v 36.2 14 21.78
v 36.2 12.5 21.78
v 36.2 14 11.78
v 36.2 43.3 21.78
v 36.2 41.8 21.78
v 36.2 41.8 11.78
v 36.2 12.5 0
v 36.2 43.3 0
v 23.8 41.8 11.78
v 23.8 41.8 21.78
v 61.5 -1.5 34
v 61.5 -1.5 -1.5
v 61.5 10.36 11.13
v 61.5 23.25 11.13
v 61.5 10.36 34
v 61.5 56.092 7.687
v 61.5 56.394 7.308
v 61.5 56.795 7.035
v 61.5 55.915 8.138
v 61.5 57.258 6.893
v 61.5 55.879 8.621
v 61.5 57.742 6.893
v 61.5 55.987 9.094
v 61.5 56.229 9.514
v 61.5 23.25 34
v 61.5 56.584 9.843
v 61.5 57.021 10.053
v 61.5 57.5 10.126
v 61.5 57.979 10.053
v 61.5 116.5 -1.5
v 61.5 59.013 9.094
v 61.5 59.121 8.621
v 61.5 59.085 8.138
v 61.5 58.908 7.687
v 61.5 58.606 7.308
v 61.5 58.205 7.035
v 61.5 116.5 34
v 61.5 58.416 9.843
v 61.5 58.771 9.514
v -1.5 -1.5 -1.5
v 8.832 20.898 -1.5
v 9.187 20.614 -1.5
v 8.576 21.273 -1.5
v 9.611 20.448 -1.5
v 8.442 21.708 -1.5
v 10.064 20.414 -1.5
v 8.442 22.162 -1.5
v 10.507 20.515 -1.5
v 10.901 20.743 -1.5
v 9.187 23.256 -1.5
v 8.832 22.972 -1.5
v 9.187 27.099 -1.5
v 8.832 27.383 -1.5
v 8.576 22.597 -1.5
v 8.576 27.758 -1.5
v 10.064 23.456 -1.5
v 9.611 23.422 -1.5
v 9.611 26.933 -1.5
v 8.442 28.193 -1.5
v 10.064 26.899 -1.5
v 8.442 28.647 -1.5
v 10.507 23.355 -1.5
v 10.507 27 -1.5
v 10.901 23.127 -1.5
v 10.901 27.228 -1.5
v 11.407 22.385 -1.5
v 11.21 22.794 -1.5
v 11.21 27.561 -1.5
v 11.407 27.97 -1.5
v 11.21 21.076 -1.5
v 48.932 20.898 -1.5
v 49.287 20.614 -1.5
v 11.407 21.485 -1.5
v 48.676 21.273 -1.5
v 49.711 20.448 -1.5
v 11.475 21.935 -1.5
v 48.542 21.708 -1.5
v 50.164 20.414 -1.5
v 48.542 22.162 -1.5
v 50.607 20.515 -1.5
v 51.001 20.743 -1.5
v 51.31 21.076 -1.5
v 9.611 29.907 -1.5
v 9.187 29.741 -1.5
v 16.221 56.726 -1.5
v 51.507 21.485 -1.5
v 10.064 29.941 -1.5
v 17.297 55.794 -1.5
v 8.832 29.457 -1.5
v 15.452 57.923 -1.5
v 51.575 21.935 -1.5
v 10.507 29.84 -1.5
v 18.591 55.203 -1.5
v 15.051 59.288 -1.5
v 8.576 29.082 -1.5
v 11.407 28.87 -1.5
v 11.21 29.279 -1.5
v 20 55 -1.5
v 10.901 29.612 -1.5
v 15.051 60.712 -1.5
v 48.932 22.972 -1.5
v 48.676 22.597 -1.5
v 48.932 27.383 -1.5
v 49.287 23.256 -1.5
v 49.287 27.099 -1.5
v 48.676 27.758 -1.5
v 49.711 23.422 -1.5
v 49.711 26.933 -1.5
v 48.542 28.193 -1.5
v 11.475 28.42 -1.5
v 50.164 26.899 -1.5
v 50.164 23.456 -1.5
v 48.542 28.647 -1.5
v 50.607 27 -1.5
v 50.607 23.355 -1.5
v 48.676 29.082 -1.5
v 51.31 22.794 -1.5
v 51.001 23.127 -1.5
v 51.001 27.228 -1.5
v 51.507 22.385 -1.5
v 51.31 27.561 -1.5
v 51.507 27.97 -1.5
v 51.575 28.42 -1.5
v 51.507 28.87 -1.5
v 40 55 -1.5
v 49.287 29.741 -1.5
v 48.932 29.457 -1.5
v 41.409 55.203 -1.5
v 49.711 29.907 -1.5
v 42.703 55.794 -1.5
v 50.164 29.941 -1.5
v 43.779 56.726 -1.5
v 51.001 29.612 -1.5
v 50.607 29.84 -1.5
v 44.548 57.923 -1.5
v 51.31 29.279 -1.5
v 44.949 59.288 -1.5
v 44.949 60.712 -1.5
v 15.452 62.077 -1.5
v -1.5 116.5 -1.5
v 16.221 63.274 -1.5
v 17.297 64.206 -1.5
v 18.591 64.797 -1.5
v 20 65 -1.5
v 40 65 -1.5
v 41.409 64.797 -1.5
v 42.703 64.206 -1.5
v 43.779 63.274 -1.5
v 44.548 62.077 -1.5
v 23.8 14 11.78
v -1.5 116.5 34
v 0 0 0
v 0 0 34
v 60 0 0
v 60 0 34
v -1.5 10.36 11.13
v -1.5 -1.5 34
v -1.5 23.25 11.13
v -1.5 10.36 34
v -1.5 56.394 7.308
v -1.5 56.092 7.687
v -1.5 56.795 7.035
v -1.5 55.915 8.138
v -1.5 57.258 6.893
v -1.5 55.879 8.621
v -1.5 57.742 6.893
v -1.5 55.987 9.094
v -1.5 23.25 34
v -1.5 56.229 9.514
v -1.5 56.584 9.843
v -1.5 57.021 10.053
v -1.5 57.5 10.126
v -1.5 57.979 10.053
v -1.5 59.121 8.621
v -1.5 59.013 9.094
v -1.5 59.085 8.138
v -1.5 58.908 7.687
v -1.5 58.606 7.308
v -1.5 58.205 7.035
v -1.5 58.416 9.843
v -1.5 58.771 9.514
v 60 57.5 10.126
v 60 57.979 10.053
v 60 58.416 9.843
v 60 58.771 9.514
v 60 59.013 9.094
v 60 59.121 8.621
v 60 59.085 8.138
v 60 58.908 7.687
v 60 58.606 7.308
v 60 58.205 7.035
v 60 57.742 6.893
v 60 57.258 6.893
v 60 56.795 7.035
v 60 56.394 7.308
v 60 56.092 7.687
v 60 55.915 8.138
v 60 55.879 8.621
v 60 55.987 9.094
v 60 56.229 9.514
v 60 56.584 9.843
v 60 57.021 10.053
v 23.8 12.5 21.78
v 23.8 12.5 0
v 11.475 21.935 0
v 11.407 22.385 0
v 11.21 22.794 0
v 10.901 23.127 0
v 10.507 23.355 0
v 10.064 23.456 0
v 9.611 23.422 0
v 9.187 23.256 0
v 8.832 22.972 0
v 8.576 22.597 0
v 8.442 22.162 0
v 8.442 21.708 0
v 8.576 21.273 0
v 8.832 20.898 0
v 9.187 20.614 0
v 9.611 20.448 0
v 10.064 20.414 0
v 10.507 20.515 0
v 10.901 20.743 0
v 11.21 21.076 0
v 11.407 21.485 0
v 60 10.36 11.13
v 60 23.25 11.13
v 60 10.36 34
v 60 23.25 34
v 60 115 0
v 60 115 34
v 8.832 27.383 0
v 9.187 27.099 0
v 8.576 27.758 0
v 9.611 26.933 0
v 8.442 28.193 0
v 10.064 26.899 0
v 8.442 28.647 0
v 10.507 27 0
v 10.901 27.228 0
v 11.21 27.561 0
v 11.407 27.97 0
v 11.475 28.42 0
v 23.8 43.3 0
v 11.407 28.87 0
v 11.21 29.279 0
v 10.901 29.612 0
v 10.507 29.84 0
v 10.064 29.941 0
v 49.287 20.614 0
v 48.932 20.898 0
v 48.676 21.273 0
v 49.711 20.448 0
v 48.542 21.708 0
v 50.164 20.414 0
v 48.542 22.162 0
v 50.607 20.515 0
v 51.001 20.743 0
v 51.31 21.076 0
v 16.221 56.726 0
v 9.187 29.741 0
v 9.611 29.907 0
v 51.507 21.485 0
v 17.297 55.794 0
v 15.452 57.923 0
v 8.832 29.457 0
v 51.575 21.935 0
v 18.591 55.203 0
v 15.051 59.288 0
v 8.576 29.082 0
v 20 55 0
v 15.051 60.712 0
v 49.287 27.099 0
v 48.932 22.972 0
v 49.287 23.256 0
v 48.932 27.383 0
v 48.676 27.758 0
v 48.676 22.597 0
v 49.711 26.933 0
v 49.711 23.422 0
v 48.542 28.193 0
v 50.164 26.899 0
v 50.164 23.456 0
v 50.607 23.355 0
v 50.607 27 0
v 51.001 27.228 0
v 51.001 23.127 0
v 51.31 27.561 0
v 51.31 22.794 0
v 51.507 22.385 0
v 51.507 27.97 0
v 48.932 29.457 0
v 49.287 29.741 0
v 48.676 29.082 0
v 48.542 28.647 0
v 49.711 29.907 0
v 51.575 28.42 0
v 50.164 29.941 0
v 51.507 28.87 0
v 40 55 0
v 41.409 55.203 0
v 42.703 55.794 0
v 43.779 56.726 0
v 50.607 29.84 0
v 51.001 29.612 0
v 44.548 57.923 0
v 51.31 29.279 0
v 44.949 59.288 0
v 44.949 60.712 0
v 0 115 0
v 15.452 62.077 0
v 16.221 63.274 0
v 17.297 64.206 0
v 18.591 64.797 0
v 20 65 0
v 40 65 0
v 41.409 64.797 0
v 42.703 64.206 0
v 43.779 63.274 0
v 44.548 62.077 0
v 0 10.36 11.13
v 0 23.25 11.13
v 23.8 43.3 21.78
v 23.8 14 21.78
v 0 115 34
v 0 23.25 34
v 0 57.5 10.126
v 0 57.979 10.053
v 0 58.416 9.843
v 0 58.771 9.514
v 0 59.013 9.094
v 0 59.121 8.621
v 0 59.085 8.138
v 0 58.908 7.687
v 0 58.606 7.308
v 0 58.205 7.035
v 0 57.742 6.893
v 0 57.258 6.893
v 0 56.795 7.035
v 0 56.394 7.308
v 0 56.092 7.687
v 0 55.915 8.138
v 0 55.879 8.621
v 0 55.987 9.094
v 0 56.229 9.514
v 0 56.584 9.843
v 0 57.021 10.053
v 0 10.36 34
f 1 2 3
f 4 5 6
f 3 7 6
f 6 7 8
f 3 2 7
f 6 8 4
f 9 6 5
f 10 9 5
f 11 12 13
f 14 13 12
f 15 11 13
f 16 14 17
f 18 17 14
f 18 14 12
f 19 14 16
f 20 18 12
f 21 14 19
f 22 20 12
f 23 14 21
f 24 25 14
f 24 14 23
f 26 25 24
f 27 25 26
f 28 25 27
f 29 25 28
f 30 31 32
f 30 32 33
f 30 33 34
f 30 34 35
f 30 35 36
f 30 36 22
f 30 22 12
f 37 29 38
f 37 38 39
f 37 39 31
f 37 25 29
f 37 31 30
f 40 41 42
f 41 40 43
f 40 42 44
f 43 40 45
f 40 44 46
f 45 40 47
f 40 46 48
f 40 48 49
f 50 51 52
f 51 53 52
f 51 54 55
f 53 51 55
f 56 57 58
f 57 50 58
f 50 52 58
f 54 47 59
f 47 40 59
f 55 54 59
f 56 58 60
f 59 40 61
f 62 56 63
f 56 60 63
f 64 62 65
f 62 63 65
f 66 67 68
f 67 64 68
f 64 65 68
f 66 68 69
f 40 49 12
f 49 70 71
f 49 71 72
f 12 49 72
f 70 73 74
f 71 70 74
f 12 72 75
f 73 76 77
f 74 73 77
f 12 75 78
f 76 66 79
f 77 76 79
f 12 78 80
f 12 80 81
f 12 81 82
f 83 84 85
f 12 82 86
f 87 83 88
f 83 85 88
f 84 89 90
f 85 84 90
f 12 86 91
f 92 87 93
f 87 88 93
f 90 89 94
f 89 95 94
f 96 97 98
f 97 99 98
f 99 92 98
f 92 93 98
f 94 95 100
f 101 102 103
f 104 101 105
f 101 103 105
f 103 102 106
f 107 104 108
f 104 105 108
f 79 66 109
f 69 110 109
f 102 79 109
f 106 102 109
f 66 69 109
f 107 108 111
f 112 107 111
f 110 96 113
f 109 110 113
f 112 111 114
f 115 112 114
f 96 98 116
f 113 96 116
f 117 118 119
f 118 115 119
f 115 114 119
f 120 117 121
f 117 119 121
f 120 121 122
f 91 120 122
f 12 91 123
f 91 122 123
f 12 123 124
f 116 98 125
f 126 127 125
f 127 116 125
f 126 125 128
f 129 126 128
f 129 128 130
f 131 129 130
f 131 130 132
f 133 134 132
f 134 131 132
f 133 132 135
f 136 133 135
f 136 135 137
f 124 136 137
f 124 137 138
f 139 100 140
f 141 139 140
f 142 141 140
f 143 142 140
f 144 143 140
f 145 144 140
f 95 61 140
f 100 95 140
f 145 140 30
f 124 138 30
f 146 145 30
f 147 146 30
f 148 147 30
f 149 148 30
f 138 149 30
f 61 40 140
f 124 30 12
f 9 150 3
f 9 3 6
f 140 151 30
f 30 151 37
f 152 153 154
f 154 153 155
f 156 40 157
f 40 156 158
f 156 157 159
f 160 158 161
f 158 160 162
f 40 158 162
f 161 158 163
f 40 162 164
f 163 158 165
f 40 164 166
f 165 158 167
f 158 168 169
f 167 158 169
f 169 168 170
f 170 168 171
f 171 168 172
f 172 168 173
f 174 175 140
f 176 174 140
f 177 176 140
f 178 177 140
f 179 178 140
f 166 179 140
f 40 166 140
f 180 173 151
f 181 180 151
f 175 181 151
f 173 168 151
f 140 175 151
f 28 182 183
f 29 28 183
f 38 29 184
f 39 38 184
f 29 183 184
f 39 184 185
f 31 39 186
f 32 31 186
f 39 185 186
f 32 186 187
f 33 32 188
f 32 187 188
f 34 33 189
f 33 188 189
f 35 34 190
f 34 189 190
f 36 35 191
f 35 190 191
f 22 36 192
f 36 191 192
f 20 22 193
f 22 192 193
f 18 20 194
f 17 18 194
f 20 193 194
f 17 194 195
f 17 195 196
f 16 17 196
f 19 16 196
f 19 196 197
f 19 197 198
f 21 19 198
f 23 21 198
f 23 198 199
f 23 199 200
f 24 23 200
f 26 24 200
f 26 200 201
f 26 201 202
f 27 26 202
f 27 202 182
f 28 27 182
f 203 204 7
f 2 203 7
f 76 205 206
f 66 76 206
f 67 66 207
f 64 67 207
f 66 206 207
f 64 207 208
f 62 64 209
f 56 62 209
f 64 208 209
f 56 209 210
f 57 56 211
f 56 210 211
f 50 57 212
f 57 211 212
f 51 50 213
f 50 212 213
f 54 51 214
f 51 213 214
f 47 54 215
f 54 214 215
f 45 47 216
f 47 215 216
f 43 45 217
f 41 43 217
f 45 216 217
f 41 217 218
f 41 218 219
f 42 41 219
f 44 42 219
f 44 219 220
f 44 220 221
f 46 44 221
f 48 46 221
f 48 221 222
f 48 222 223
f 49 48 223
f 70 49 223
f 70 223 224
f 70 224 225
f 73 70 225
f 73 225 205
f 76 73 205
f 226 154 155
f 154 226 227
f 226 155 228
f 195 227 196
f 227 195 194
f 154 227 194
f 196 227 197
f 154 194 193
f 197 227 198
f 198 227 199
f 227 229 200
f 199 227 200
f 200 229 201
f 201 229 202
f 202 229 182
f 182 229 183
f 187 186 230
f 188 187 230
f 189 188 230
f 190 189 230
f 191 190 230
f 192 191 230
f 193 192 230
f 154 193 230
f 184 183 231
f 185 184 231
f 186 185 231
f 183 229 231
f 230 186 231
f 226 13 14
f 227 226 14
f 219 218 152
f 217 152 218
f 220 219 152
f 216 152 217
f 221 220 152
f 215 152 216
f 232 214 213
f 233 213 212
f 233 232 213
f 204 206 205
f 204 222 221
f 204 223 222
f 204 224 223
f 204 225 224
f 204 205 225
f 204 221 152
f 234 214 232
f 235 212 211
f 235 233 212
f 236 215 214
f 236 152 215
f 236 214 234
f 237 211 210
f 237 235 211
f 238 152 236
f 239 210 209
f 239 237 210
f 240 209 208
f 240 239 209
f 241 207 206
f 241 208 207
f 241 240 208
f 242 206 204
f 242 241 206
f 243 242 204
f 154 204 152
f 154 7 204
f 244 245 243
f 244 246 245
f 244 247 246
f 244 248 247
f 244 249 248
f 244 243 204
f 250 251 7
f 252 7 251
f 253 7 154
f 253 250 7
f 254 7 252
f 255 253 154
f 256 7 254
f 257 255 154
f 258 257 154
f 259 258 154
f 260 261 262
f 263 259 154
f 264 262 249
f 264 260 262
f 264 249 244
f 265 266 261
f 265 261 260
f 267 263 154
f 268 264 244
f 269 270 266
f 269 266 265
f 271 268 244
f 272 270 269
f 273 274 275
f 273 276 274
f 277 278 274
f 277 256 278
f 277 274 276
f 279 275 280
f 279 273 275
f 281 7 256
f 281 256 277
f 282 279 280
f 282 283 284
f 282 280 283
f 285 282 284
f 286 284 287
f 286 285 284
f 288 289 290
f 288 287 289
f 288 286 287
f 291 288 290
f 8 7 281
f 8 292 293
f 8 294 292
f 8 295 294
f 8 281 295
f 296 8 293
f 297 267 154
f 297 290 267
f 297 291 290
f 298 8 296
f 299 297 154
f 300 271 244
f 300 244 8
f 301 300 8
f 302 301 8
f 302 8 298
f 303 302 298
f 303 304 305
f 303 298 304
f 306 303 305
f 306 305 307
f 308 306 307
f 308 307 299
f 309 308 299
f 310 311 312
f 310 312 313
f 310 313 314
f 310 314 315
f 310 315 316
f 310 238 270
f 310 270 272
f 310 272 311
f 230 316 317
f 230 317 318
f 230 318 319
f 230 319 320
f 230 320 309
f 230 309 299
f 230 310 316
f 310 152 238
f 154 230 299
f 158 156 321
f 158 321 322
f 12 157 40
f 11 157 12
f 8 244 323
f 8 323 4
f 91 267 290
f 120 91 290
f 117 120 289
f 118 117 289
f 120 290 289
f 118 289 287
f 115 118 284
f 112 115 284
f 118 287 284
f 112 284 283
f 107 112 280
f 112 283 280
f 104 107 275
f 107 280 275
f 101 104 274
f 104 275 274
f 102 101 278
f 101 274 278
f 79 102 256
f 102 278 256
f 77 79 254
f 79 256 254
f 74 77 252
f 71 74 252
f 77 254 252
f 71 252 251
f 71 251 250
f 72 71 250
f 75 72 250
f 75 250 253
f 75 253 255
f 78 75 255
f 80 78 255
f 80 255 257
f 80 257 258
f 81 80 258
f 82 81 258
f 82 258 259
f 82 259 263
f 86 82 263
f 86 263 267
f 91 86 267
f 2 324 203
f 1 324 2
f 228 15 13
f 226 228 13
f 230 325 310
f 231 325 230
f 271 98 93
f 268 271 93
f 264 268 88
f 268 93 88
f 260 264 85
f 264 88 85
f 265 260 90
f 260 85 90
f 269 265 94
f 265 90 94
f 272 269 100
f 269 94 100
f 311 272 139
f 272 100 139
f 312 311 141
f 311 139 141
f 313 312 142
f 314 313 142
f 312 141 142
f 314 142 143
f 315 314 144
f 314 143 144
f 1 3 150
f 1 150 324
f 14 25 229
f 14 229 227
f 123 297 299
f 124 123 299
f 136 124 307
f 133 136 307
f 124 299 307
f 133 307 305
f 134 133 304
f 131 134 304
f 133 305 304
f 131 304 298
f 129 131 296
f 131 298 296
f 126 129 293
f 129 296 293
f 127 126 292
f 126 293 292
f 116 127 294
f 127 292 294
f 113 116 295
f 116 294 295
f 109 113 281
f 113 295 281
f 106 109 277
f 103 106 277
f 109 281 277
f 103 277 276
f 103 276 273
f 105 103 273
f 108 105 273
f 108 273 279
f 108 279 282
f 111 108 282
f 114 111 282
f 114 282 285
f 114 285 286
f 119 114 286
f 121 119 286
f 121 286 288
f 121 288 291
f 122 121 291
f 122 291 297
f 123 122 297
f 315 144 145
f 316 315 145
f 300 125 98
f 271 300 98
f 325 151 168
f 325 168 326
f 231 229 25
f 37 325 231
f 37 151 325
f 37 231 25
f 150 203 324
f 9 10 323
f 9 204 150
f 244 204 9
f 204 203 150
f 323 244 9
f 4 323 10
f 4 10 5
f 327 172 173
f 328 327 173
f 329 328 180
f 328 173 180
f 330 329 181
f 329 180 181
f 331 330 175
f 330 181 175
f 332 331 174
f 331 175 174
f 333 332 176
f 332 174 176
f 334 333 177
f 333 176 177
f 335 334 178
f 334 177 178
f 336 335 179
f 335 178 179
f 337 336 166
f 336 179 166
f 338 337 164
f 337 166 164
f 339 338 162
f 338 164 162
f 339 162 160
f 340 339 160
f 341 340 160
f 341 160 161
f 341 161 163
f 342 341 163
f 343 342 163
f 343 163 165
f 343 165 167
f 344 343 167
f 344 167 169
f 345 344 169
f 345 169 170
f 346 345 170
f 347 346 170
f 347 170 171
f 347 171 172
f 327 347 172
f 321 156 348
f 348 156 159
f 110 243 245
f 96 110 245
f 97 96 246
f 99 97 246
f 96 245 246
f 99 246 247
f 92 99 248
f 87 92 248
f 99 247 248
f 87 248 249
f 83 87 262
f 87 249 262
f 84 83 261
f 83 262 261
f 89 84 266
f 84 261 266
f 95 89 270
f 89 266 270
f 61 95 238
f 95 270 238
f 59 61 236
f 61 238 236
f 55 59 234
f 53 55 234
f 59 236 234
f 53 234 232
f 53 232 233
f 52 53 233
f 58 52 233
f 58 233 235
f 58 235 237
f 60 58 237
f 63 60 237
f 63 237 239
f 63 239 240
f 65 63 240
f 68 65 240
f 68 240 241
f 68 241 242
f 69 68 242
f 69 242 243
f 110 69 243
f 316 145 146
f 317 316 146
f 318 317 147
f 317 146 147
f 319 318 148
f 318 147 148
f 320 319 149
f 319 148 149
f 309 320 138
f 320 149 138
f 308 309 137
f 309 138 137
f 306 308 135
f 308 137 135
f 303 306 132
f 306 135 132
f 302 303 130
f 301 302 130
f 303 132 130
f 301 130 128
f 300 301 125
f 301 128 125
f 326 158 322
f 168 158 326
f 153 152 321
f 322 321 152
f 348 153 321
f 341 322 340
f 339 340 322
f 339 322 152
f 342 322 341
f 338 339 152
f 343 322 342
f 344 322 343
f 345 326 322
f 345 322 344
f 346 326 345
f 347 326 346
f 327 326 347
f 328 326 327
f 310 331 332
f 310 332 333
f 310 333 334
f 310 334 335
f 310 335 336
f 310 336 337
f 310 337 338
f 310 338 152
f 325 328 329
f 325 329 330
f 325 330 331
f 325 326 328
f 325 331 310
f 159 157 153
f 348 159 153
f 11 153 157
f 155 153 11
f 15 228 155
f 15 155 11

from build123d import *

# Parameters (mm, degrees)
SKETCH1_W                  = 63
SKETCH1_H                  = 118
BOSS_EXTRUDE1_DEPTH        = 35.5
SKETCH2_W                  = 60
SKETCH2_H                  = 115
CUT_EXTRUDE1_DEPTH         = 34
SKETCH3_W                  = 12.4
SKETCH3_H                  = 30.8
BOSS_EXTRUDE2_DEPTH        = 21.78
CUT_EXTRUDE2_REACH         = 129.081
SKETCH4_W                  = 10
SKETCH4_H                  = 27.8
CUT_EXTRUDE3_REACH         = 138.738
SKETCH5_W                  = 22.87
SKETCH5_H                  = 12.89
CUT_EXTRUDE4_REACH         = 138.738
SKETCH6_W                  = 22.87
SKETCH6_H                  = 12.89
CUT_EXTRUDE5_DEPTH         = 137.435882377
M2_5_CLEARANCE_HOLE1_D     = 3.05
M2_5_CLEARANCE_HOLE1_DEPTH = 35.5
M3_CLEARANCE_HOLE1_D       = 3.2512
M3_CLEARANCE_HOLE1_DEPTH   = 1.5
M3_CLEARANCE_HOLE2_D       = 3.2512
M3_CLEARANCE_HOLE2_DEPTH   = 63


with BuildPart() as part:
    # Sketch1 → Boss-Extrude1 (new body)
    with BuildSketch(Plane.XY.offset(34)):
        with Locations((30, 57.5)):
            Rectangle(SKETCH1_W, SKETCH1_H)
    extrude(amount=-BOSS_EXTRUDE1_DEPTH)

    # Sketch2 → Cut-Extrude1 (cut)
    with BuildSketch(Plane.XY.offset(34)):
        with Locations((30, 57.5)):
            Rectangle(SKETCH2_W, SKETCH2_H)
    extrude(amount=-CUT_EXTRUDE1_DEPTH, mode=Mode.SUBTRACT)

    # Sketch3 → Boss-Extrude2 (add)
    with BuildSketch(Plane.XY):
        with Locations((30, 27.9)):
            Rectangle(SKETCH3_W, SKETCH3_H)
    extrude(amount=BOSS_EXTRUDE2_DEPTH)

    # Sketch4 → Cut-Extrude2 (cut, up to next)
    with BuildSketch(Plane.ZY.offset(-23.8), mode=Mode.PRIVATE) as cut_extrude2_sk1:
        with Locations((16.78, 27.9)):
            Rectangle(SKETCH4_W, SKETCH4_H)
    cut_extrude2_tool1 = extrude(cut_extrude2_sk1.sketch, amount=-CUT_EXTRUDE2_REACH, mode=Mode.PRIVATE) & part.part
    add(cut_extrude2_tool1.solids().sort_by_distance((23.8, 27.9, 16.78))[0], mode=Mode.SUBTRACT)

    # Sketch5 → Cut-Extrude3 (cut, up to next)
    with BuildSketch(Plane(origin=(61.5, 0, 0), x_dir=(0, 0, -1), z_dir=(1, 0, 0)), mode=Mode.PRIVATE) as cut_extrude3_sk1:
        with Locations((-22.565, 16.805)):
            Rectangle(SKETCH5_W, SKETCH5_H)
    cut_extrude3_tool1 = extrude(cut_extrude3_sk1.sketch, amount=-CUT_EXTRUDE3_REACH, mode=Mode.PRIVATE) & part.part
    add(cut_extrude3_tool1.solids().sort_by_distance((61.5, 16.805, 22.565))[0], mode=Mode.SUBTRACT)

    # Sketch6 → Cut-Extrude4 (cut, up to next)
    with BuildSketch(Plane.ZY.offset(1.5), mode=Mode.PRIVATE) as cut_extrude4_sk1:
        with Locations((22.565, 16.805)):
            Rectangle(SKETCH6_W, SKETCH6_H)
    cut_extrude4_tool1 = extrude(cut_extrude4_sk1.sketch, amount=-CUT_EXTRUDE4_REACH, mode=Mode.PRIVATE) & part.part
    add(cut_extrude4_tool1.solids().sort_by_distance((-1.5, 16.805, 22.565))[0], mode=Mode.SUBTRACT)

    # Sketch7 → Cut-Extrude5 (cut, through all)
    with BuildSketch(Plane(origin=(0, 0, -1.5), x_dir=(-1, 0, 0), z_dir=(0, 0, -1))):
        with BuildLine():
            Line((-40, 55), (-20, 55))
            ThreePointArc((-20, 55), (-15, 60), (-20, 65))
            Line((-20, 65), (-40, 65))
            ThreePointArc((-40, 65), (-45, 60), (-40, 55))
        make_face()
    extrude(amount=-CUT_EXTRUDE5_DEPTH, mode=Mode.SUBTRACT)

    # M2.5 Clearance Hole1
    with Locations(Plane(origin=(0, 0, -1.5), x_dir=(-1, 0, 0), z_dir=(0, 0, -1))):
        with Locations((-9.95, 28.42), (-9.95, 21.935), (-50.05, 28.42), (-50.05, 21.935)):
            Hole(M2_5_CLEARANCE_HOLE1_D / 2, depth=M2_5_CLEARANCE_HOLE1_DEPTH)

    # M3 Clearance Hole1
    with Locations(Plane(origin=(0, 0, 0), x_dir=(0, 0, -1), z_dir=(1, 0, 0))):
        with Locations((-8.5, 57.5)):
            Hole(M3_CLEARANCE_HOLE1_D / 2, depth=M3_CLEARANCE_HOLE1_DEPTH)

    # M3 Clearance Hole2
    with Locations(Plane(origin=(61.5, 0, 0), x_dir=(0, 0, -1), z_dir=(1, 0, 0))):
        with Locations((-8.5, 57.5)):
            Hole(M3_CLEARANCE_HOLE2_D / 2, depth=M3_CLEARANCE_HOLE2_DEPTH)


solid = part.part
